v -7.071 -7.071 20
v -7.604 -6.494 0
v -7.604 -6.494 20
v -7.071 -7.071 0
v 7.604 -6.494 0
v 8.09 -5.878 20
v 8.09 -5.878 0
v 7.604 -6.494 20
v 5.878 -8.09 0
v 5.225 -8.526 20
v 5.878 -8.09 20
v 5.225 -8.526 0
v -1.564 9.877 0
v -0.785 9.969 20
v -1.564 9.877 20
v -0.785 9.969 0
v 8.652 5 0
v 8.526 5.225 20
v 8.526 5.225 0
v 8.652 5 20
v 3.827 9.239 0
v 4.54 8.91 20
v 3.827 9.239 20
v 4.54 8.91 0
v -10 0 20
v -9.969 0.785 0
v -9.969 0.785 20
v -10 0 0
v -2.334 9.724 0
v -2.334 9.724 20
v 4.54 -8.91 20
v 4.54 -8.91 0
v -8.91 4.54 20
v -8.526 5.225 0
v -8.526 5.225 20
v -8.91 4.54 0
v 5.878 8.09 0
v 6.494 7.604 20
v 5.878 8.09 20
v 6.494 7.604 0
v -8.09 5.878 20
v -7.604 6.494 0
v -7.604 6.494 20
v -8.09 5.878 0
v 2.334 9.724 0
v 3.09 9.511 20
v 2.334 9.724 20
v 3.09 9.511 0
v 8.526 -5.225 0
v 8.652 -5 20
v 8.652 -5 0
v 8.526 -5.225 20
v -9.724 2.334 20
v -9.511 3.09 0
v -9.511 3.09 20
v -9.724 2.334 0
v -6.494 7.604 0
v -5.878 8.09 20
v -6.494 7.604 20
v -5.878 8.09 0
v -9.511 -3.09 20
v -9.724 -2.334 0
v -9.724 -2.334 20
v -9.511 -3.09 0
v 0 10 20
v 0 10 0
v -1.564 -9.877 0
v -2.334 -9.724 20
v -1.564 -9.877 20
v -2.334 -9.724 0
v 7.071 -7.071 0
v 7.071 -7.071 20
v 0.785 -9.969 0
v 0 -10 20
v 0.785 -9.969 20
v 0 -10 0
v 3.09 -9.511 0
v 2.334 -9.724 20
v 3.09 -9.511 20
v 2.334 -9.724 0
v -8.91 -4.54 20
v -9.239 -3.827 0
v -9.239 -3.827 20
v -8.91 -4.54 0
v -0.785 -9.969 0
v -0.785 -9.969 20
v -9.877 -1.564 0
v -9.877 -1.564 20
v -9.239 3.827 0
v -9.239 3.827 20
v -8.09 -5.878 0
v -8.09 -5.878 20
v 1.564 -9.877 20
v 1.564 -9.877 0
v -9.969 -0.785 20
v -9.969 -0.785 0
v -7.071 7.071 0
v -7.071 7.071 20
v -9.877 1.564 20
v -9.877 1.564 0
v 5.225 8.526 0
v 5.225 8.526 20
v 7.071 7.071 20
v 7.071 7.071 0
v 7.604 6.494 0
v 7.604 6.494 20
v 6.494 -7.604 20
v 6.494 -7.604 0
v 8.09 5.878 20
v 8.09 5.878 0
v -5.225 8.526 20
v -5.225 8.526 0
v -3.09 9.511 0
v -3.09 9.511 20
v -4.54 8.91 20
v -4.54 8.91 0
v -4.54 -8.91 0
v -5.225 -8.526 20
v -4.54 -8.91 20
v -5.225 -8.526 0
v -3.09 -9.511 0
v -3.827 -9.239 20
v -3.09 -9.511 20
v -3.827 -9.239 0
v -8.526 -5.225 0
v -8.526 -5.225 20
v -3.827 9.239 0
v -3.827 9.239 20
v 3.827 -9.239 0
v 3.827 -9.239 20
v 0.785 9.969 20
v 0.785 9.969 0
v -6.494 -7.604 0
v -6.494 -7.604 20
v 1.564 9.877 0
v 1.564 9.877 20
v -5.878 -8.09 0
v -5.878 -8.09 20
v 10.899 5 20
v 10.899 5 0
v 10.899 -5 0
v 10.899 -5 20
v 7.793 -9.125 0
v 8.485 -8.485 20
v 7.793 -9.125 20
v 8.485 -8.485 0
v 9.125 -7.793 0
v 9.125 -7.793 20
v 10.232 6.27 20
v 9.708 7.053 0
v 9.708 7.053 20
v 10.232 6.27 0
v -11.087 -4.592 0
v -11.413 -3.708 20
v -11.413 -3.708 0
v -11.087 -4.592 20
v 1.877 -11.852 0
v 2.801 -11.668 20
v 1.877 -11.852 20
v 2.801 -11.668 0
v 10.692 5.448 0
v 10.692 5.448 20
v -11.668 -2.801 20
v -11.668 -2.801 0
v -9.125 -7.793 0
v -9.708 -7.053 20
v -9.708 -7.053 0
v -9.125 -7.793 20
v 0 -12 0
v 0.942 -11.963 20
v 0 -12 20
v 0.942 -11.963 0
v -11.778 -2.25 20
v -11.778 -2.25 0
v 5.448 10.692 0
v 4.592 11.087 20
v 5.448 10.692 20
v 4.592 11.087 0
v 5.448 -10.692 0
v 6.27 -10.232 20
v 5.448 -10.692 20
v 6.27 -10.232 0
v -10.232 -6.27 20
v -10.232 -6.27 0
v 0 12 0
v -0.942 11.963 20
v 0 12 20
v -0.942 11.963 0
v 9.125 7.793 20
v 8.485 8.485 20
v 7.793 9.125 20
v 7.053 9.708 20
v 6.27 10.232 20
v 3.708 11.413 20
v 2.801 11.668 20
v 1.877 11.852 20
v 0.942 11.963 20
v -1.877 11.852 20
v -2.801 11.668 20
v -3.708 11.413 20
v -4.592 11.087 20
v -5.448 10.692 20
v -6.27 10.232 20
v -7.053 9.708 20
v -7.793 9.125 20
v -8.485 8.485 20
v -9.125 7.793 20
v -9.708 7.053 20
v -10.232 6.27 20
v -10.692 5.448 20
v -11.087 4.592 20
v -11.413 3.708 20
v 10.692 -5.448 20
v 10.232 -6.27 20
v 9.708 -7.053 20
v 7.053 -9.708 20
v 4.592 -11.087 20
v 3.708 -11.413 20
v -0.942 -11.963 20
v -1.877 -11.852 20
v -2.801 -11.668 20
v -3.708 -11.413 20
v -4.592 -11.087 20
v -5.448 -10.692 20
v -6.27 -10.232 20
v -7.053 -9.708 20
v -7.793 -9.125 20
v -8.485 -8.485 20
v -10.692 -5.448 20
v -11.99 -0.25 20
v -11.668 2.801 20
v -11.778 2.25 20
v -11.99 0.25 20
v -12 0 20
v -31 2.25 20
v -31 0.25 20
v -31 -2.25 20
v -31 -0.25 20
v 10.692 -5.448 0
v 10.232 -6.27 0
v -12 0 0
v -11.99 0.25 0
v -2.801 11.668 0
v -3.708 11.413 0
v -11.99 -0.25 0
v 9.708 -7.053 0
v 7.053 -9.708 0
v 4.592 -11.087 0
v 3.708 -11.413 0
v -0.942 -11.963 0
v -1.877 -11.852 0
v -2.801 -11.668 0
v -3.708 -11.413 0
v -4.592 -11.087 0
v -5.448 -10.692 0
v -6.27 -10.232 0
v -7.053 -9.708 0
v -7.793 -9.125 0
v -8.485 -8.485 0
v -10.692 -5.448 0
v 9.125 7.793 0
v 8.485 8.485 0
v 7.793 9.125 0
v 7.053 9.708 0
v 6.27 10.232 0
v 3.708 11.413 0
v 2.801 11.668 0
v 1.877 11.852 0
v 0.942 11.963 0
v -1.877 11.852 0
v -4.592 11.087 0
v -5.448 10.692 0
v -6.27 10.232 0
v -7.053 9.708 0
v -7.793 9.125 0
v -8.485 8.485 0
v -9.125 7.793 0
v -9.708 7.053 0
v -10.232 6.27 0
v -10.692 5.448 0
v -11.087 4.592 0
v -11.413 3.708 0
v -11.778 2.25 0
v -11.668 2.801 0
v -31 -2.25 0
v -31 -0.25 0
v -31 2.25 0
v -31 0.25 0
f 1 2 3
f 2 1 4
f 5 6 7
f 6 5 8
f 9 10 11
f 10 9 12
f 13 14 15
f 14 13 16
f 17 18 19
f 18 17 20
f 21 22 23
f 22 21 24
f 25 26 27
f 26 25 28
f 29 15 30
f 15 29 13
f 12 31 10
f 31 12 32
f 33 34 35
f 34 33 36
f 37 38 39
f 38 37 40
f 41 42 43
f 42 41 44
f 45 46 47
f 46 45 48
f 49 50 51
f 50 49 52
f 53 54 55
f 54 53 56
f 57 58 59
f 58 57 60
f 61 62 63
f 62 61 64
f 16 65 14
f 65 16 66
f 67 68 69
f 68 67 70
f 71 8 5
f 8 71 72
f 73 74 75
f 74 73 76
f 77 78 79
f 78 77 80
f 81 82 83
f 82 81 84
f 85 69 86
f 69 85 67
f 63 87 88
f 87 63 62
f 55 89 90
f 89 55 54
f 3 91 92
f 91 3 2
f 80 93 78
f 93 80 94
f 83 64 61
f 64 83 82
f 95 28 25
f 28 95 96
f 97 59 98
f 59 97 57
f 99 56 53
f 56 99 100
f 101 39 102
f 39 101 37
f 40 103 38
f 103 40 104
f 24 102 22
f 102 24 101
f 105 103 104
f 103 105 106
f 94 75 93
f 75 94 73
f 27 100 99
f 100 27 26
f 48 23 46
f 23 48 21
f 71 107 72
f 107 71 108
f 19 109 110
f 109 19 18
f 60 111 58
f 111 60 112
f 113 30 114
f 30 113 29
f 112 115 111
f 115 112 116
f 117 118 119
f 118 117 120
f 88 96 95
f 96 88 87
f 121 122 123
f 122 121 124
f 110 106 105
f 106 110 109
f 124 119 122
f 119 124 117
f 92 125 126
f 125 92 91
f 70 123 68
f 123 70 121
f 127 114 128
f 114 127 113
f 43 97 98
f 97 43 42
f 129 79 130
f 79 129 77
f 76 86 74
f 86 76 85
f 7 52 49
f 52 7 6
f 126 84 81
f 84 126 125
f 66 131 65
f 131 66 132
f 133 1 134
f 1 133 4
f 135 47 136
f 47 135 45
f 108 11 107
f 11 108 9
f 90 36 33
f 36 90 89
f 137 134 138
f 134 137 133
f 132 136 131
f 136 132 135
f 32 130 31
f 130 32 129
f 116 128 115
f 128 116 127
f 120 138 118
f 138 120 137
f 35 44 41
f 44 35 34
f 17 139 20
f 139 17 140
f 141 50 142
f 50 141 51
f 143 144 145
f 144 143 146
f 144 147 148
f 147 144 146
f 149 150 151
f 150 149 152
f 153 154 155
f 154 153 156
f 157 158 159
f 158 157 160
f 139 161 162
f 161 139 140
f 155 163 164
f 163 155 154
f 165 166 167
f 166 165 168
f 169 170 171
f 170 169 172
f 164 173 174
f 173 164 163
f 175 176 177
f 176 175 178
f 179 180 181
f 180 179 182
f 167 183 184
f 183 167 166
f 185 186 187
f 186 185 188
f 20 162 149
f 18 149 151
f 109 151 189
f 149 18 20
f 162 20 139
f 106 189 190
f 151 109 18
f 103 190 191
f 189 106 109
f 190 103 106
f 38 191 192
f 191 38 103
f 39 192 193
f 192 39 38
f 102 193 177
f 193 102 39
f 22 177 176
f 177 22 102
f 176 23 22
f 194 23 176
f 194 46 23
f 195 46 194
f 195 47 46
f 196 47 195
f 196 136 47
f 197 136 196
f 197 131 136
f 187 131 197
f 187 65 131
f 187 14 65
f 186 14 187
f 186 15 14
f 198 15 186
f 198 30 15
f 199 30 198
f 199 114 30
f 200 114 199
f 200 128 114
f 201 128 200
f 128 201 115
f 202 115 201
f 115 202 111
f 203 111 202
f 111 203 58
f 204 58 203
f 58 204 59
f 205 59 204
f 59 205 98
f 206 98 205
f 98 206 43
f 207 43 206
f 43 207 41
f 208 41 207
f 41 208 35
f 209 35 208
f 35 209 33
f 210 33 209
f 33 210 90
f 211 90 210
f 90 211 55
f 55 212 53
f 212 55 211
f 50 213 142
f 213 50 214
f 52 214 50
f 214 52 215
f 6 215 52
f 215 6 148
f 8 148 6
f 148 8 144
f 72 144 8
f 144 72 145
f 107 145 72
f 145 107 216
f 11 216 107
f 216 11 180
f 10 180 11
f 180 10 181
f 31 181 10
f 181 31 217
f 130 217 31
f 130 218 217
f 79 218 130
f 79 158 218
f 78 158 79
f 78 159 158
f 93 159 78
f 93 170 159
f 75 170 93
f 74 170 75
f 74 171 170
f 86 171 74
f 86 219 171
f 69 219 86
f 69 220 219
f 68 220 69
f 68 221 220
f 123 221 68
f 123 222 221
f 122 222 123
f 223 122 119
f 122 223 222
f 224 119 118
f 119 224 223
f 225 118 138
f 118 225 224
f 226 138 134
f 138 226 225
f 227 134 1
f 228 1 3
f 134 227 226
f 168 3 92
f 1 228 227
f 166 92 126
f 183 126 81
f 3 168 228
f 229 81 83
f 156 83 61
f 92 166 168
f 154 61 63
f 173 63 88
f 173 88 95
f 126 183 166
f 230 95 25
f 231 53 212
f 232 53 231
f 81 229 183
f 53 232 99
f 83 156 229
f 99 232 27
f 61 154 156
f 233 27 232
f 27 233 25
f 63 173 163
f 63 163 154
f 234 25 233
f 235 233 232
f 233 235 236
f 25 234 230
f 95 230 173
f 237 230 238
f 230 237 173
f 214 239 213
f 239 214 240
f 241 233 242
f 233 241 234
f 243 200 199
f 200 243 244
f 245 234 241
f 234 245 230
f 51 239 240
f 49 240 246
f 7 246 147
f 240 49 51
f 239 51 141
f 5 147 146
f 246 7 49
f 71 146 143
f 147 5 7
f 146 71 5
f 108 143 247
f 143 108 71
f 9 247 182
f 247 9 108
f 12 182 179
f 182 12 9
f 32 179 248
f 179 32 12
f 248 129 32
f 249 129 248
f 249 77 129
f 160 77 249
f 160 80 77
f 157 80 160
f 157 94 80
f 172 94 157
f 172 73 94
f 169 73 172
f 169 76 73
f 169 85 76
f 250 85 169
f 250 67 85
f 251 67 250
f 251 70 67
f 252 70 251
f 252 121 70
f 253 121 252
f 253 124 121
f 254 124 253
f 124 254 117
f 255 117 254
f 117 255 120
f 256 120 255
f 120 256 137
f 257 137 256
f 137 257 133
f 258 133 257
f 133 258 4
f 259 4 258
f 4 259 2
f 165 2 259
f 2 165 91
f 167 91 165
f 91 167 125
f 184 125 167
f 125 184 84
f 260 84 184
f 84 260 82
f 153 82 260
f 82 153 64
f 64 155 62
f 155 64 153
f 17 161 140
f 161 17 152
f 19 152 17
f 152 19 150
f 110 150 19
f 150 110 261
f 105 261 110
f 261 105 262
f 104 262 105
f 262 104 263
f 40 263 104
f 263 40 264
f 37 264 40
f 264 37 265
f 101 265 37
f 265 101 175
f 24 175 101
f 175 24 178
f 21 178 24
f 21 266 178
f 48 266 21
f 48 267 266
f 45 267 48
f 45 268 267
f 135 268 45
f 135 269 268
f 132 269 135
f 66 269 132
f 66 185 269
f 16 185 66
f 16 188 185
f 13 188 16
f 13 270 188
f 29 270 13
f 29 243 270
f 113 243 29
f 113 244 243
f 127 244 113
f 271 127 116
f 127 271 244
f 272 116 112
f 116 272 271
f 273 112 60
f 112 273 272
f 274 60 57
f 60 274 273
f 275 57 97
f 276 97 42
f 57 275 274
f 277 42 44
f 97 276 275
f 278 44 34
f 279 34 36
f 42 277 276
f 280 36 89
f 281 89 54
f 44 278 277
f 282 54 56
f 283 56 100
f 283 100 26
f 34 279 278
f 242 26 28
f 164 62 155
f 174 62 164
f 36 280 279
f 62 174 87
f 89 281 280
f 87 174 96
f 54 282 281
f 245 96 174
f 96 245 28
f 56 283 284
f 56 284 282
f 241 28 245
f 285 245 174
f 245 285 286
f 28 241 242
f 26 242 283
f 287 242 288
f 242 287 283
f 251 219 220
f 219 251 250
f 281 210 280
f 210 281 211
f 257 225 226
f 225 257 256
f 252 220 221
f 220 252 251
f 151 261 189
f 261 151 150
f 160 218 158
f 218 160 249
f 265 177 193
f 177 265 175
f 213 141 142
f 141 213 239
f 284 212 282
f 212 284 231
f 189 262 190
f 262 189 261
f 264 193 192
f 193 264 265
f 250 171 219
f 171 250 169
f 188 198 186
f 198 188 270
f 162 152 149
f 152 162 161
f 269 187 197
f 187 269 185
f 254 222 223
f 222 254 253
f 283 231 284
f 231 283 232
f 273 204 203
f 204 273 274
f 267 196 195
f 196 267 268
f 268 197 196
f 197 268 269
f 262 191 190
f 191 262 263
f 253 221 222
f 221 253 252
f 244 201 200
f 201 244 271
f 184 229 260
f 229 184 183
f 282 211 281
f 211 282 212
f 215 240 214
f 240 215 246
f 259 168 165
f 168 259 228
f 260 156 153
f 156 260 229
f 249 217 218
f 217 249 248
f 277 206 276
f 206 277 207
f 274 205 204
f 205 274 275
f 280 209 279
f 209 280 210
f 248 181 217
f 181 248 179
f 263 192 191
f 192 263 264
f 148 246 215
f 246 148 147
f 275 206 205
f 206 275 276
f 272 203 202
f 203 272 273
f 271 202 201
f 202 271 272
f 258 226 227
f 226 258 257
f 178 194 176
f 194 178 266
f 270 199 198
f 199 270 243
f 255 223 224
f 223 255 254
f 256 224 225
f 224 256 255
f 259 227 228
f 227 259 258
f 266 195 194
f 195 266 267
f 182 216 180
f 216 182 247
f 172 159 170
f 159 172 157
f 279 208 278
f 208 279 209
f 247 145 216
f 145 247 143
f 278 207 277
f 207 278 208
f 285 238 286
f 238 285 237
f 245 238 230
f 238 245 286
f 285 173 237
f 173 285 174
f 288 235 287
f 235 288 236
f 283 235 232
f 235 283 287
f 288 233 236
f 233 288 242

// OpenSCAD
// diameter of door handle in mm
handle_diameter = 20;
logo_image_file = "wi1logo.dat"; // [image_surface:44x26]
radius = handle_diameter / 2;




rotate([0,-90,0]) union() {
translate([0,-2.25,radius+1]) cube(size = [20,2,20]);

translate([1,-2.2,radius+3]) rotate([90,0,0]) 
    
    scale([0.4, 0.4, 1]) surface(file = logo_image_file, invert = false);


translate([0,0.25,radius+1]) cube(size = [20,2,20]);

rotate([0,90,0]) {
    
    difference() {
        cylinder(h=20, r=radius+2, $fn=80);
        union() {
            translate([0,0,-3]) cylinder(h=40, r=radius, $fn=80);
            translate([0,-5,-10]) cube([50,10,100]);
        }
    }
}

}
